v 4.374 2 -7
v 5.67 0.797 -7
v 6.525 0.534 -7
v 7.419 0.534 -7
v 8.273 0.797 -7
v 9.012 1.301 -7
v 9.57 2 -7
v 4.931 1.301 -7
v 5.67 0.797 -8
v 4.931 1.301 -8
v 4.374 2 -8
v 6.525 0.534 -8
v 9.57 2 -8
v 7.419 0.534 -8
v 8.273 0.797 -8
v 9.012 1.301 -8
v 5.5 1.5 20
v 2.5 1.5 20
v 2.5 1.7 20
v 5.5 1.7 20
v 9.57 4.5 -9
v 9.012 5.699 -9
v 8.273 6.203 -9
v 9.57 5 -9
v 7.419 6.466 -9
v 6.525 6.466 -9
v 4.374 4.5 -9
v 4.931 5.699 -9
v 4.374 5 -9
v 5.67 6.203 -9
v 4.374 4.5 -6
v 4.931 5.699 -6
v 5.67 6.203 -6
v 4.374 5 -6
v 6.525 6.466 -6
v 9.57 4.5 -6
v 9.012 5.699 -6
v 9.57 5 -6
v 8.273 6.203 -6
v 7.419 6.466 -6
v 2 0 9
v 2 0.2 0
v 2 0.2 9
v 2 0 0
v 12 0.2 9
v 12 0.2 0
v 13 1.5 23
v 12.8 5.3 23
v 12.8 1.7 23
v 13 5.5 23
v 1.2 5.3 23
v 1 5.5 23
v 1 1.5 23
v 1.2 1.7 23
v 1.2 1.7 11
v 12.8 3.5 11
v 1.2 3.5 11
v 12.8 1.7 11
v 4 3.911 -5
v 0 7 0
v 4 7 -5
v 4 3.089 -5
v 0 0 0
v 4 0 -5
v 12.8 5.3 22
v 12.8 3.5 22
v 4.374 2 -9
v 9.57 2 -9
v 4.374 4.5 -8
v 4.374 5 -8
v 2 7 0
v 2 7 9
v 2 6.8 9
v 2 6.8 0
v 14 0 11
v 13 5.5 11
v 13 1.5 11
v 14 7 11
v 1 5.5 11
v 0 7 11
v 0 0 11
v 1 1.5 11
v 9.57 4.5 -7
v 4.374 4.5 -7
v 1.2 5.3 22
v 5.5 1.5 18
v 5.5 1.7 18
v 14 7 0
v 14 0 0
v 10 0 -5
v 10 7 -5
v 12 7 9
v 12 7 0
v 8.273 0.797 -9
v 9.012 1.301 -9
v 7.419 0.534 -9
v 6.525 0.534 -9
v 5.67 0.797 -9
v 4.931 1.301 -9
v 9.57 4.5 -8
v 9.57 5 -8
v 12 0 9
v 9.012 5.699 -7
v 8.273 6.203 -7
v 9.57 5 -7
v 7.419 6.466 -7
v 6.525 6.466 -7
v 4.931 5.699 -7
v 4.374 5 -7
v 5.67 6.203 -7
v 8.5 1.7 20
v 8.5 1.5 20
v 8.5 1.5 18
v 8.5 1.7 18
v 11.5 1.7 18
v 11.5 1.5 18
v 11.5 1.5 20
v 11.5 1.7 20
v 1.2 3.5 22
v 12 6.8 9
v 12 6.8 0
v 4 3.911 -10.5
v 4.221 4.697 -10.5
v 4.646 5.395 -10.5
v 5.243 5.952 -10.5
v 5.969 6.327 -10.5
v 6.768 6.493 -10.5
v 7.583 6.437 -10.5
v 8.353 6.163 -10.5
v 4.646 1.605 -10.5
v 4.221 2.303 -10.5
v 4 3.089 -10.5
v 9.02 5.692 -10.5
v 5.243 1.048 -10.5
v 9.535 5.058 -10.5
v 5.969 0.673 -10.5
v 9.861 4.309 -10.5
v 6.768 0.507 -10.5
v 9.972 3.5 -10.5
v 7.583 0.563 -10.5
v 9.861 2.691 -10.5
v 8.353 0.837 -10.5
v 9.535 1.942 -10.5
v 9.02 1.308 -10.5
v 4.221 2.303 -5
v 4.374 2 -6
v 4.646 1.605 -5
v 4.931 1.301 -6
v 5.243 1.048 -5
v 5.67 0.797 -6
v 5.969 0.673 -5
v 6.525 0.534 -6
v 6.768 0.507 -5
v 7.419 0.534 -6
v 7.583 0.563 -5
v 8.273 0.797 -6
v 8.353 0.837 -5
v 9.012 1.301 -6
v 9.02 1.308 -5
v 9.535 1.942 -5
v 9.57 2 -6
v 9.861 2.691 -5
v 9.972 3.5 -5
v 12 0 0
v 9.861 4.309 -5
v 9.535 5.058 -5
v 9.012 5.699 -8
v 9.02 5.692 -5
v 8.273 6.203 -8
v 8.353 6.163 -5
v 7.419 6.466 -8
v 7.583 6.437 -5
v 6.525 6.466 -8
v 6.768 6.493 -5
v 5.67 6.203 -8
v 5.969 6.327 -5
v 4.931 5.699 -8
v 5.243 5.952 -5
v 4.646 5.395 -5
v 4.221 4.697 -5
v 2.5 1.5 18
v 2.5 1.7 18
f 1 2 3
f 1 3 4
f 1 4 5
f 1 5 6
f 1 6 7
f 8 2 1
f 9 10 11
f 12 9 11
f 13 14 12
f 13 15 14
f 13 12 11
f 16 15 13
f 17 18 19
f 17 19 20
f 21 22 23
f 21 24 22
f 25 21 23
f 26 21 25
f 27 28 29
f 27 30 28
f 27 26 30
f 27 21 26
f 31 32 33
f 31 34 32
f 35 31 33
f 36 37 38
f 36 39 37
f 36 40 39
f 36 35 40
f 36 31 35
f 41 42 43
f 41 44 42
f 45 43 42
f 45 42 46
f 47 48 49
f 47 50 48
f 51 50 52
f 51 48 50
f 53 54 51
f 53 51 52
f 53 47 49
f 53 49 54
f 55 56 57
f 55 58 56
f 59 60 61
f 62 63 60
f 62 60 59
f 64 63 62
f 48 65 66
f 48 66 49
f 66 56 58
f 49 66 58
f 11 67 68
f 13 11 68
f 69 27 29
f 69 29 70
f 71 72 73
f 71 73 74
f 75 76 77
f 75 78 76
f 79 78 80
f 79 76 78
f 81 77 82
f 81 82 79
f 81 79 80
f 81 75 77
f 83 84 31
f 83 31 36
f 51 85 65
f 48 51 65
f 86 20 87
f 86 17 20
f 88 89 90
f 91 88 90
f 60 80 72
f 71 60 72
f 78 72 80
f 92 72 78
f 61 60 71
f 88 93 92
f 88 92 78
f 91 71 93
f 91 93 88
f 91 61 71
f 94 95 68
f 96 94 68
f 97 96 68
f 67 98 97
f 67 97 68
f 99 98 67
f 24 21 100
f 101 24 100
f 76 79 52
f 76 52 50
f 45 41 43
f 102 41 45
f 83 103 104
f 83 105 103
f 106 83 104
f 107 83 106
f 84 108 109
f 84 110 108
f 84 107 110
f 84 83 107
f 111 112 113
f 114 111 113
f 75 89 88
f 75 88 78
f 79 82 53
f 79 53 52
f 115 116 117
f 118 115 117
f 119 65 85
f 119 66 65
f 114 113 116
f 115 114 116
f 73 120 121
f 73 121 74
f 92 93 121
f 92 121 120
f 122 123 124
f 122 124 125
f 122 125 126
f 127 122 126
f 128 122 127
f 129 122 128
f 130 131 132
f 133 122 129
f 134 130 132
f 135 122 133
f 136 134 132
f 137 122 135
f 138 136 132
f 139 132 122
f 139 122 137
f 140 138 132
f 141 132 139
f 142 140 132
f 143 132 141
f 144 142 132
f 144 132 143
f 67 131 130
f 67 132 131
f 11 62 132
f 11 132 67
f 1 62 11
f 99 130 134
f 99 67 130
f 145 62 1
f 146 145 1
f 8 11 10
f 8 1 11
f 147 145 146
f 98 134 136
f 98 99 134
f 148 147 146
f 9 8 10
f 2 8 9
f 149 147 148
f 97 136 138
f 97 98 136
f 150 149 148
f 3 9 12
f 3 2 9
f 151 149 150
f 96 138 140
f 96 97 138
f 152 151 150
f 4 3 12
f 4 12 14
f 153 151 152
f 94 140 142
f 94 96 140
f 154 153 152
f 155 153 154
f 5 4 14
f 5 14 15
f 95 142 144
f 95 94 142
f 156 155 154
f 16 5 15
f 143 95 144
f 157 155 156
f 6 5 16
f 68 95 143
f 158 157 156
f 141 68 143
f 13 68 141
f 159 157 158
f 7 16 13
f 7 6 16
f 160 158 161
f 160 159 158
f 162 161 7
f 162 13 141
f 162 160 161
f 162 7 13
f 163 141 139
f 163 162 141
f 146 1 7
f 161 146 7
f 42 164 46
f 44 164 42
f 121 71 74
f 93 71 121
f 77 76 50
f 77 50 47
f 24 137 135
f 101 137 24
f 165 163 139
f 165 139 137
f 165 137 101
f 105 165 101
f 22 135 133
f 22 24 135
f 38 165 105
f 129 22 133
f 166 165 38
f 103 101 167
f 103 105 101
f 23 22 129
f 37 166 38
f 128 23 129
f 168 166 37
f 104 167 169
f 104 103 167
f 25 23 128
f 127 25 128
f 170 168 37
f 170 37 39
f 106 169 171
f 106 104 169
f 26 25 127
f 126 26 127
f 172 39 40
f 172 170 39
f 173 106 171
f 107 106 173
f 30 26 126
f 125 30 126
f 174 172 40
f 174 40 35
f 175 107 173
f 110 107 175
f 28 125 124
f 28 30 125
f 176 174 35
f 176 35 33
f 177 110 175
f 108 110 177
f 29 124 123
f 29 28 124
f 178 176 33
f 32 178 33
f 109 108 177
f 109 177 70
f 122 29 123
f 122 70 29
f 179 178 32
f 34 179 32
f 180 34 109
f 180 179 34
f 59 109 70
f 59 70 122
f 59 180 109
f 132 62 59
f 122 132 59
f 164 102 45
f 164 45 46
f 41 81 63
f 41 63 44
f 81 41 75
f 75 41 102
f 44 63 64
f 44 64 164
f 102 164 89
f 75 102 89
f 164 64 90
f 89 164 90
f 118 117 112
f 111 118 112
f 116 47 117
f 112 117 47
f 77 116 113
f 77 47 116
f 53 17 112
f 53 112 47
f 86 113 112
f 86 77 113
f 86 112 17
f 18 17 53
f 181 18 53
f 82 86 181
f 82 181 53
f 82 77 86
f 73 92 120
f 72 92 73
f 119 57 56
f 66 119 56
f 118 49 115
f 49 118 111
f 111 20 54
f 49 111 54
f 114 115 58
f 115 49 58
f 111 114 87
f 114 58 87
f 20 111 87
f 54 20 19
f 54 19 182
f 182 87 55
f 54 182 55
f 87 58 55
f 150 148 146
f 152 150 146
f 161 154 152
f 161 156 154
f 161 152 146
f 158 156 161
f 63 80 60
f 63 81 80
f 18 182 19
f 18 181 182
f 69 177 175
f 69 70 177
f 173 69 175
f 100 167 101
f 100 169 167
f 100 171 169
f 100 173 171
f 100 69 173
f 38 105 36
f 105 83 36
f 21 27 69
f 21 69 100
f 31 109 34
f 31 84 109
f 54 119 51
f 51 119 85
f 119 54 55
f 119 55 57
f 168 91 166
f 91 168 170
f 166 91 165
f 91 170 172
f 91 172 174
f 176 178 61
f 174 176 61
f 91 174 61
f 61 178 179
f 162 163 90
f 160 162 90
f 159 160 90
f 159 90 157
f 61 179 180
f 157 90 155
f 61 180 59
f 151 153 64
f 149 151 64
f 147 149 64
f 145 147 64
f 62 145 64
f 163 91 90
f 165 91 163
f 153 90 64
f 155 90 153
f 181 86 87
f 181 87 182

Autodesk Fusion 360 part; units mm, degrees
sketch "草图1" plane through (0, 0, 0) normal (0, 1, 0) x (1, 0, 0)
  line L0 (0, 0) -> (14, 0)
  line L1 (14, 0) -> (14, -11)
  line L2 (14, -11) -> (0, -11)
  line L3 (0, -11) -> (0, 0)
  line L4 (7, -11) -> (7, 8) construction
  line L5 (7, 5) -> (10, 5)
  line L6 (7, 5) -> (4, 5)
  line L7 (0, 0) -> (4, 5)
  line L8 (14, 0) -> (10, 5)
  dimension "d1" = 14
  dimension "d2" = 11
  dimension "d3" = 3
  dimension "d4" = 3
  dimension "d5" = 5
extrude "拉伸1" add sketch "草图1" along normal blind 7
sketch "草图2" plane through (0, 0, 11) normal (0, 0, 1) x (-1, 0, 0)
  line L0 (0, 0) -> (-14, 0)
  line L1 (-14, 0) -> (-14, -7)
  line L2 (-14, -7) -> (0, -7)
  line L3 (0, -7) -> (0, 0)
  line L4 (-1, -5.5) -> (-13, -5.5)
  line L5 (-13, -5.5) -> (-13, -1.5)
  line L6 (-13, -1.5) -> (-1, -1.5)
  line L7 (-1, -1.5) -> (-1, -5.5)
  line L8 (-1.2, -1.7) -> (-1.2, -5.3)
  line L9 (-1.2, -5.3) -> (-12.8, -5.3)
  line L10 (-12.8, -5.3) -> (-12.8, -1.7)
  line L11 (-12.8, -1.7) -> (-1.2, -1.7)
  line L12 (-1.2, -3.5) -> (-12.8, -3.5)
  dimension "d8" = 12
  dimension "d9" = 4
  dimension "d10" = 1.5
  dimension "d11" = 1
  dimension "d12" = 0.2
extrude "拉伸2" add sketch "草图2" along normal blind 12 contours L4 L5 L6 L7
extrude "拉伸3" add sketch "草图2" along normal blind 11 contours L8 L9 L10 L12
sketch "草图3" plane through (0, 0, 0) normal (0, -1, 0) x (1, 0, 0)
  line L0 (14, 0) -> (14, 11)
  line L1 (14, 11) -> (0, 11)
  line L2 (0, 11) -> (0, 0)
  line L3 (0, 0) -> (4, -5)
  line L4 (4, -5) -> (10, -5)
  line L5 (10, -5) -> (14, 0)
  line L6 (2, 9) -> (12, 9)
  line L7 (12, 9) -> (12, 0)
  line L8 (12, 0) -> (2, 0)
  line L9 (2, 0) -> (2, 9)
extrude "拉伸4" cut sketch "草图3" against normal blind 0.2 contours L6 L7 L8 L9
sketch "草图4" plane through (0, 7, 0) normal (0, 1, 0) x (-1, 0, 0)
  line L0 (-14, 11) -> (-14, 0)
  line L1 (-14, 0) -> (-10, -5)
  line L2 (-10, -5) -> (-4, -5)
  line L3 (-4, -5) -> (0, 0)
  line L4 (0, 0) -> (0, 11)
  line L5 (0, 11) -> (-14, 11)
  line L6 (-12, 9) -> (-2, 9)
  line L7 (-2, 9) -> (-2, 0)
  line L8 (-2, 0) -> (-12, 0)
  line L9 (-12, 0) -> (-12, 9)
extrude "拉伸5" cut sketch "草图4" against normal blind 0.2 contours L6 L7 L8 L9
sketch "草图5" plane through (0, 1.5, 0) normal (0, -1, 0) x (1, 0, 0)
  line L0 (1, 11) -> (13, 11)
  line L1 (13, 11) -> (13, 23)
  line L2 (13, 23) -> (1, 23)
  line L3 (1, 23) -> (1, 11)
  line L4 (7, 11) -> (7, 23) construction
  line L5 (2.5, 20) -> (5.5, 20)
  line L6 (5.5, 20) -> (5.5, 18)
  line L7 (5.5, 18) -> (2.5, 18)
  line L8 (2.5, 18) -> (2.5, 20)
  line L9 (11.5, 20) -> (8.5, 20)
  line L10 (11.5, 18) -> (11.5, 20)
  line L11 (8.5, 18) -> (11.5, 18)
  line L12 (8.5, 20) -> (8.5, 18)
  dimension "d21" = 1.5
extrude "拉伸6" cut sketch "草图5" against normal up to surface (0.2 mm away) contours L5 L6 L7 L8 | L9 L10 L11 L12
sketch "草图6" plane through (0, 0, -5) normal (0, 0, -1) x (1, 0, 0)
  line L0 (10, 0) -> (4, 0)
  line L1 (4, 0) -> (4, -7)
  line L2 (4, -7) -> (10, -7)
  line L3 (10, -7) -> (10, 0)
  circle A0 centre (6.9717, -3.5) radius 3
  dimension "d24" = 6
extrude "拉伸7" add sketch "草图6" along normal blind 5.5 contours L1 A0 picked at (7.5942, -2.8884)
sketch "草图7" plane through (0, 0, 0) normal (0, 1, 0) x (1, 0, 0)
  line L0 (4, 6) -> (10, 6)
  line L1 (10, 6) -> (10, 7)
  line L2 (10, 7) -> (4, 7)
  line L3 (4, 7) -> (4, 6)
  line L4 (4, 8) -> (10, 8)
  line L5 (10, 8) -> (10, 9)
  line L6 (10, 9) -> (4, 9)
  line L7 (4, 9) -> (4, 8)
extrude "拉伸8" cut sketch "草图7" along normal blind 2
extrude "拉伸9" cut 2 faces at (6.1056, 2, -6.3333) (6.1056, 2, -8.3333) along direction (0, 1, 0) blind 2 from surface at 2.5
